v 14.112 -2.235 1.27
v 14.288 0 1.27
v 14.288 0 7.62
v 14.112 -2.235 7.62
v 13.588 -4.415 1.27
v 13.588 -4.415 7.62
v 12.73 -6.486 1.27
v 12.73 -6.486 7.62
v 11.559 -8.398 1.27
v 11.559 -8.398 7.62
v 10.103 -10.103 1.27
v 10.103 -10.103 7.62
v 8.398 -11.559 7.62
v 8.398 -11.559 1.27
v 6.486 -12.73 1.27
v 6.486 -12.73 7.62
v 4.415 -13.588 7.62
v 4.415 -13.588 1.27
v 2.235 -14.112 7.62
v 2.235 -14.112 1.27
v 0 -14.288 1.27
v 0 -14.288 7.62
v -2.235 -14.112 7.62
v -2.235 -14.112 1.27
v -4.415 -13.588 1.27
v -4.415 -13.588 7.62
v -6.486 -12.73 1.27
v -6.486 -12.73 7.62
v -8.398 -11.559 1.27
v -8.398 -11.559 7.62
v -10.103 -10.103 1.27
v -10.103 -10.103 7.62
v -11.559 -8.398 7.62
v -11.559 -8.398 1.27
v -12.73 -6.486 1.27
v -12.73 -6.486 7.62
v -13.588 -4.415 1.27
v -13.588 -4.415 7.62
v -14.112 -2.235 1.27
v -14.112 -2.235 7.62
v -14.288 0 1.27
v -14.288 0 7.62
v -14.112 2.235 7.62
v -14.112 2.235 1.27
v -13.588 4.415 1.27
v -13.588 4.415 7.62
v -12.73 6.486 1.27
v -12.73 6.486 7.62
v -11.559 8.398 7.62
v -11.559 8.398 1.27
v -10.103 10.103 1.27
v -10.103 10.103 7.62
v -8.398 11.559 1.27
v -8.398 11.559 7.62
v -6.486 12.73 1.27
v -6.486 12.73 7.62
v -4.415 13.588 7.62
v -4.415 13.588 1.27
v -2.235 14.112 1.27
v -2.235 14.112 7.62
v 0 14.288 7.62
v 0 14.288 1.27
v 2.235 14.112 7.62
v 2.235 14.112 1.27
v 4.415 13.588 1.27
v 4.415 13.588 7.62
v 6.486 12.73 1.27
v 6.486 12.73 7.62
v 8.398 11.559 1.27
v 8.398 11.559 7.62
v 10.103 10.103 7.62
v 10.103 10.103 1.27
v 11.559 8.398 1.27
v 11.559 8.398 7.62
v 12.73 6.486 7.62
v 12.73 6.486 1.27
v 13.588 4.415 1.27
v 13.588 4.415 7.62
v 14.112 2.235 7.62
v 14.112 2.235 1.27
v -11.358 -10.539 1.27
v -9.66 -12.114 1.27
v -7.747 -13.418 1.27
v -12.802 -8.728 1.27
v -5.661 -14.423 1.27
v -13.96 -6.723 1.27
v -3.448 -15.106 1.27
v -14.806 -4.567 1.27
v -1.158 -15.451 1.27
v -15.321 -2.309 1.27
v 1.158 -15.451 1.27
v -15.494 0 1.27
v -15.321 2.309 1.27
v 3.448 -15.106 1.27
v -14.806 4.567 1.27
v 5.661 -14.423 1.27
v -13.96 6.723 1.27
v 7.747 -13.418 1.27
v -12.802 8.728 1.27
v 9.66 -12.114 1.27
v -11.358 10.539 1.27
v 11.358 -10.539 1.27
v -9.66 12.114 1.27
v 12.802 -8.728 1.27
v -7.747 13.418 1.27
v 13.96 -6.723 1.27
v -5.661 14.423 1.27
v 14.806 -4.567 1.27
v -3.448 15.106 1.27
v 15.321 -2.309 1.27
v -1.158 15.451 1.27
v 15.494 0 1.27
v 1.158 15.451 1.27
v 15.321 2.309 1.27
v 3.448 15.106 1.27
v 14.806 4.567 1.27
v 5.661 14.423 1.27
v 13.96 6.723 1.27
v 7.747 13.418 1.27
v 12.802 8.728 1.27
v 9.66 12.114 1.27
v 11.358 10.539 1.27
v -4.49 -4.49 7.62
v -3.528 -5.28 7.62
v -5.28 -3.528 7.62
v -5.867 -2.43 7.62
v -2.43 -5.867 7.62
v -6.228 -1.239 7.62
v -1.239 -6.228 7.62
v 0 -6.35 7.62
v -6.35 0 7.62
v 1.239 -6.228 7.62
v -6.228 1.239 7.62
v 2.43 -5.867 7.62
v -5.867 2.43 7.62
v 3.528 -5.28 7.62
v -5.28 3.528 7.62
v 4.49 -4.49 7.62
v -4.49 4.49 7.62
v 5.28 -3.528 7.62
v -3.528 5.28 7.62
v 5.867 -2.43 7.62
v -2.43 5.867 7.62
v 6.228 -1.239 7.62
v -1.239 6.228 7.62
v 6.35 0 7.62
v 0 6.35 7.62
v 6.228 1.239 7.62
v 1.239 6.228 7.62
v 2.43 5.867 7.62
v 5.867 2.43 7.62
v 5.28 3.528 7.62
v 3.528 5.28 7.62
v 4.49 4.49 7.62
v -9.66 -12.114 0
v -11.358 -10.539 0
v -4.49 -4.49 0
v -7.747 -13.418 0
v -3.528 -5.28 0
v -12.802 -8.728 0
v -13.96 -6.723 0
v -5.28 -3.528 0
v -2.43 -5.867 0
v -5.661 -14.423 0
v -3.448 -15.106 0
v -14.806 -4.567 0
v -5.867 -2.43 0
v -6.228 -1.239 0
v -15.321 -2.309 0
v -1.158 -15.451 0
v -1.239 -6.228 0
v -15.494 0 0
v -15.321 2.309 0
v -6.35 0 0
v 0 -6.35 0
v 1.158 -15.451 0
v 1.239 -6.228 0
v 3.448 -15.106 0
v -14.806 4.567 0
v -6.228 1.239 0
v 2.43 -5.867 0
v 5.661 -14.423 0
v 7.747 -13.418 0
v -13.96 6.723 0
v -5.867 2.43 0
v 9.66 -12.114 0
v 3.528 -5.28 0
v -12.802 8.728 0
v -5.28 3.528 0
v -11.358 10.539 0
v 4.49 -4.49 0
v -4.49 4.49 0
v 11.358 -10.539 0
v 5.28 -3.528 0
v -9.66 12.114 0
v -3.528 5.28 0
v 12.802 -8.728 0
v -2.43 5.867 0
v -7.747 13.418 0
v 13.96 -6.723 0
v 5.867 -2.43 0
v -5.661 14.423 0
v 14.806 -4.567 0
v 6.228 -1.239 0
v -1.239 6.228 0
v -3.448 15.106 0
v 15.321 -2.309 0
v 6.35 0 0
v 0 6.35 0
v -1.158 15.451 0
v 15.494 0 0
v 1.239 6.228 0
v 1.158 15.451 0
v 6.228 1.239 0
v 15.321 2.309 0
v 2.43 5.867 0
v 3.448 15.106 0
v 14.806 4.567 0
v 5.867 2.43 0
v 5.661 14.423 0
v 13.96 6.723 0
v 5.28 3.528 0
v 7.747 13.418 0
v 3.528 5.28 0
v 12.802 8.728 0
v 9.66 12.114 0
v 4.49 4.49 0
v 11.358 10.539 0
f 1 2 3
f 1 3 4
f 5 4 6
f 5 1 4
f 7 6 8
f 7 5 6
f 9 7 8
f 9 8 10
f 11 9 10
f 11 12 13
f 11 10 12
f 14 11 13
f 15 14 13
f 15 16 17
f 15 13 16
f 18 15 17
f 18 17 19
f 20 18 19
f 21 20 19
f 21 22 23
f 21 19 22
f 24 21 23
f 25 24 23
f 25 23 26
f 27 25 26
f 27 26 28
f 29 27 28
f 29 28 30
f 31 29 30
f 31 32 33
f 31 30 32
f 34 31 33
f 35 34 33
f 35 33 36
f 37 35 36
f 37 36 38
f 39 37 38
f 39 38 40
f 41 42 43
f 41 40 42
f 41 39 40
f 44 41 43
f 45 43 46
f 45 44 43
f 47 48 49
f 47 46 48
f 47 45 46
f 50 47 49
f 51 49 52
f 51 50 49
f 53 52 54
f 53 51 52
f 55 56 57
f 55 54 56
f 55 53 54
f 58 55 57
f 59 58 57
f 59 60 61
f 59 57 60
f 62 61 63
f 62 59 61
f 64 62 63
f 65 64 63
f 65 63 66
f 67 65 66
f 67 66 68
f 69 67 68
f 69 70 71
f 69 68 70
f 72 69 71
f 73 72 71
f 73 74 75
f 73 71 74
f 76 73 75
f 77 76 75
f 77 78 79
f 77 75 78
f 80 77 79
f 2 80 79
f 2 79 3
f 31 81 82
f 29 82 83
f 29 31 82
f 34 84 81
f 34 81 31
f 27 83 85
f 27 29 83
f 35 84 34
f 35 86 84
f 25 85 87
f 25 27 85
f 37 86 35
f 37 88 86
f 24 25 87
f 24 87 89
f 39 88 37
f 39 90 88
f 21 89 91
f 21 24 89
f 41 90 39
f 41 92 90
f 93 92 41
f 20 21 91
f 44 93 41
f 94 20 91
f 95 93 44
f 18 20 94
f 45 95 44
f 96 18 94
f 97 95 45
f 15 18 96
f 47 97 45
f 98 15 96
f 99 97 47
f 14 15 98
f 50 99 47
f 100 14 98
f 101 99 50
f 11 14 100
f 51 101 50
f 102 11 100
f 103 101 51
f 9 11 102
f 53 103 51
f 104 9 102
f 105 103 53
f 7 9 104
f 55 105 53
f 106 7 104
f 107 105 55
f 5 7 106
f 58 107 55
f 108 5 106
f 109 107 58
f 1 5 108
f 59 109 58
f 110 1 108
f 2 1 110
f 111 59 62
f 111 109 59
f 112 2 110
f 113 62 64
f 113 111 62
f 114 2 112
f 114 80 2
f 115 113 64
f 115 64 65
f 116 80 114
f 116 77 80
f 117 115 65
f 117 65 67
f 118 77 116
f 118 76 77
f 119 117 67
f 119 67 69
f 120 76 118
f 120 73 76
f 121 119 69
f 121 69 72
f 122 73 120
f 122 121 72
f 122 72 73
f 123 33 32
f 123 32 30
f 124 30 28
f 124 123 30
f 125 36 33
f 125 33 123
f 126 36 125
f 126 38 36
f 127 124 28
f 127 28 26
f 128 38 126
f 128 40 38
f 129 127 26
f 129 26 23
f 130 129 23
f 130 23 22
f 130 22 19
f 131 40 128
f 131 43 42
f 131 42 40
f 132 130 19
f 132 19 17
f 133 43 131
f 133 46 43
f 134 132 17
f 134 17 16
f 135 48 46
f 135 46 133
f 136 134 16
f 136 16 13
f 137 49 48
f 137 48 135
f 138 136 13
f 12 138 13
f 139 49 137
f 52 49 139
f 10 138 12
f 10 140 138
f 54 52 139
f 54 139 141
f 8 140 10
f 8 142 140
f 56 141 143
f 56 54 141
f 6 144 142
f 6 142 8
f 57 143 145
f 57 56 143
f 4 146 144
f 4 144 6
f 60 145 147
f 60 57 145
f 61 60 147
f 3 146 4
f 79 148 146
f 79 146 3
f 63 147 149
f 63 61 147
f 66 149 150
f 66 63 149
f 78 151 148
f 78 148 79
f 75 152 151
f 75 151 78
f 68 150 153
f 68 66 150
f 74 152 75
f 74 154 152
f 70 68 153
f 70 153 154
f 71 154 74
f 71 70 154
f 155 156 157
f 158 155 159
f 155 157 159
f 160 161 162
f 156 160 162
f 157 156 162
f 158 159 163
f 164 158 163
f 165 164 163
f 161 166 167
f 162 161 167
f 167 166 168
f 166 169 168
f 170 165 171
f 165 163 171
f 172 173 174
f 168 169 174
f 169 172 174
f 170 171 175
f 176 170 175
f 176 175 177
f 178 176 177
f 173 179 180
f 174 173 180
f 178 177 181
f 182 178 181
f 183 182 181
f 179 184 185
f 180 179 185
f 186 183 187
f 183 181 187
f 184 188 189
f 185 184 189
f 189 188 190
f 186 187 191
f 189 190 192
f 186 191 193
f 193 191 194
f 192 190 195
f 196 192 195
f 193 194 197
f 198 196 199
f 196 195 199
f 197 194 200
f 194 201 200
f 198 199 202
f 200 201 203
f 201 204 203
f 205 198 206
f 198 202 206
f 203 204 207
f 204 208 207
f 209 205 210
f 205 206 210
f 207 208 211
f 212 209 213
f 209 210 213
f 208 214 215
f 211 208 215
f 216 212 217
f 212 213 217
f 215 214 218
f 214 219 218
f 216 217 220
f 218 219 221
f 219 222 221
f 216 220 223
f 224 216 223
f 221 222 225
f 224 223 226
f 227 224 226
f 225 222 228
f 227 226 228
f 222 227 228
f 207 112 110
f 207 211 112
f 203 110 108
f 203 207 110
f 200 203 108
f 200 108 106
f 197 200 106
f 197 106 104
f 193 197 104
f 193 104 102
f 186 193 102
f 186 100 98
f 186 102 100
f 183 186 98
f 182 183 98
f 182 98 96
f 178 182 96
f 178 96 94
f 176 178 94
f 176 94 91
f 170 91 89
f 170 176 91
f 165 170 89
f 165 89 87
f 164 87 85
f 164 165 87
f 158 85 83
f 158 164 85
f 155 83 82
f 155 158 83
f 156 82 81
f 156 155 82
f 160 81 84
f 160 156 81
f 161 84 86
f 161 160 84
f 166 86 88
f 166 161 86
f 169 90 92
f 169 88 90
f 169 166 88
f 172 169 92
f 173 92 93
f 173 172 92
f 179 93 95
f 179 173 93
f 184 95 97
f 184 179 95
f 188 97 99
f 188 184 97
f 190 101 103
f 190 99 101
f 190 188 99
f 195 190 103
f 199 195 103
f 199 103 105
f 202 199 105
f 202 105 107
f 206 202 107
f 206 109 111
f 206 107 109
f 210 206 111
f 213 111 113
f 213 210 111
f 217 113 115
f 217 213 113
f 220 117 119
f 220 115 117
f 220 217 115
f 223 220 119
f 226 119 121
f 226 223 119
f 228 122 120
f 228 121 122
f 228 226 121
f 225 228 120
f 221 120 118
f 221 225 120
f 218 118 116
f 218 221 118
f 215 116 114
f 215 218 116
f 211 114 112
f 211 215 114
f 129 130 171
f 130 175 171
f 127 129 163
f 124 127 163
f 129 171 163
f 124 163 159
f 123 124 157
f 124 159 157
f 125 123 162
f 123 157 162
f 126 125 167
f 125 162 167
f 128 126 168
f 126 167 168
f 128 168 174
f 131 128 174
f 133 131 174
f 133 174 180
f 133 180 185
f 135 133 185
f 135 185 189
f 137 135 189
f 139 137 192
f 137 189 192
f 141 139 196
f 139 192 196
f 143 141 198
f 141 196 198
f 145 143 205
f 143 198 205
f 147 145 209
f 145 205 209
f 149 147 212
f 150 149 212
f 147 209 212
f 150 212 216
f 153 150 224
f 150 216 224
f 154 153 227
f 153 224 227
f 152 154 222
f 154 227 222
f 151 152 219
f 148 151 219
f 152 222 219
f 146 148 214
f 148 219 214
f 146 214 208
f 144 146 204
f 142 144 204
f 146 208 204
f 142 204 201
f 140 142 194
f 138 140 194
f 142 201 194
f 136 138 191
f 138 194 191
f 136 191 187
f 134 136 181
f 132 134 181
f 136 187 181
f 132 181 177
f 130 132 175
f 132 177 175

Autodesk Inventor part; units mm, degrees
ref_plane "YZ Plane" through (0, 0, 0) normal (1, 0, 0) x (0, 1, 0)
ref_plane "XZ Plane" through (0, 0, 0) normal (0, 1, 0) x (-1, 0, 0)
ref_plane "XY Plane" through (0, 0, 0) normal (0, 0, 1) x (1, 0, 0)
sketch "Sketch1" plane through (0, 0, 0) normal (0, 0, 1) x (1, 0, 0)
  circle A0 centre (0, 0) radius 15.494
  dimension "d0" = 30.988
extrude "Extrusion1" add sketch "Sketch1" along normal blind 1.27
sketch "Sketch2" plane through (0, 0, 1.27) normal (0, 0, 1) x (1, 0, 0)
  circle A0 centre (0, 0) radius 14.2875
  dimension "d3" = 28.575
extrude "Extrusion2" add sketch "Sketch2" along normal blind 6.35
sketch "Sketch3" plane through (0, 0, 7.62) normal (0, 0, 1) x (1, 0, 0)
  point P0 (0, 0)
  point P1 (0, 0)
hole "Hole1" at (0, 0, 7.62) direction (0, 0, -1) diameter 12.7 end through all
properties part number "Bearing"
